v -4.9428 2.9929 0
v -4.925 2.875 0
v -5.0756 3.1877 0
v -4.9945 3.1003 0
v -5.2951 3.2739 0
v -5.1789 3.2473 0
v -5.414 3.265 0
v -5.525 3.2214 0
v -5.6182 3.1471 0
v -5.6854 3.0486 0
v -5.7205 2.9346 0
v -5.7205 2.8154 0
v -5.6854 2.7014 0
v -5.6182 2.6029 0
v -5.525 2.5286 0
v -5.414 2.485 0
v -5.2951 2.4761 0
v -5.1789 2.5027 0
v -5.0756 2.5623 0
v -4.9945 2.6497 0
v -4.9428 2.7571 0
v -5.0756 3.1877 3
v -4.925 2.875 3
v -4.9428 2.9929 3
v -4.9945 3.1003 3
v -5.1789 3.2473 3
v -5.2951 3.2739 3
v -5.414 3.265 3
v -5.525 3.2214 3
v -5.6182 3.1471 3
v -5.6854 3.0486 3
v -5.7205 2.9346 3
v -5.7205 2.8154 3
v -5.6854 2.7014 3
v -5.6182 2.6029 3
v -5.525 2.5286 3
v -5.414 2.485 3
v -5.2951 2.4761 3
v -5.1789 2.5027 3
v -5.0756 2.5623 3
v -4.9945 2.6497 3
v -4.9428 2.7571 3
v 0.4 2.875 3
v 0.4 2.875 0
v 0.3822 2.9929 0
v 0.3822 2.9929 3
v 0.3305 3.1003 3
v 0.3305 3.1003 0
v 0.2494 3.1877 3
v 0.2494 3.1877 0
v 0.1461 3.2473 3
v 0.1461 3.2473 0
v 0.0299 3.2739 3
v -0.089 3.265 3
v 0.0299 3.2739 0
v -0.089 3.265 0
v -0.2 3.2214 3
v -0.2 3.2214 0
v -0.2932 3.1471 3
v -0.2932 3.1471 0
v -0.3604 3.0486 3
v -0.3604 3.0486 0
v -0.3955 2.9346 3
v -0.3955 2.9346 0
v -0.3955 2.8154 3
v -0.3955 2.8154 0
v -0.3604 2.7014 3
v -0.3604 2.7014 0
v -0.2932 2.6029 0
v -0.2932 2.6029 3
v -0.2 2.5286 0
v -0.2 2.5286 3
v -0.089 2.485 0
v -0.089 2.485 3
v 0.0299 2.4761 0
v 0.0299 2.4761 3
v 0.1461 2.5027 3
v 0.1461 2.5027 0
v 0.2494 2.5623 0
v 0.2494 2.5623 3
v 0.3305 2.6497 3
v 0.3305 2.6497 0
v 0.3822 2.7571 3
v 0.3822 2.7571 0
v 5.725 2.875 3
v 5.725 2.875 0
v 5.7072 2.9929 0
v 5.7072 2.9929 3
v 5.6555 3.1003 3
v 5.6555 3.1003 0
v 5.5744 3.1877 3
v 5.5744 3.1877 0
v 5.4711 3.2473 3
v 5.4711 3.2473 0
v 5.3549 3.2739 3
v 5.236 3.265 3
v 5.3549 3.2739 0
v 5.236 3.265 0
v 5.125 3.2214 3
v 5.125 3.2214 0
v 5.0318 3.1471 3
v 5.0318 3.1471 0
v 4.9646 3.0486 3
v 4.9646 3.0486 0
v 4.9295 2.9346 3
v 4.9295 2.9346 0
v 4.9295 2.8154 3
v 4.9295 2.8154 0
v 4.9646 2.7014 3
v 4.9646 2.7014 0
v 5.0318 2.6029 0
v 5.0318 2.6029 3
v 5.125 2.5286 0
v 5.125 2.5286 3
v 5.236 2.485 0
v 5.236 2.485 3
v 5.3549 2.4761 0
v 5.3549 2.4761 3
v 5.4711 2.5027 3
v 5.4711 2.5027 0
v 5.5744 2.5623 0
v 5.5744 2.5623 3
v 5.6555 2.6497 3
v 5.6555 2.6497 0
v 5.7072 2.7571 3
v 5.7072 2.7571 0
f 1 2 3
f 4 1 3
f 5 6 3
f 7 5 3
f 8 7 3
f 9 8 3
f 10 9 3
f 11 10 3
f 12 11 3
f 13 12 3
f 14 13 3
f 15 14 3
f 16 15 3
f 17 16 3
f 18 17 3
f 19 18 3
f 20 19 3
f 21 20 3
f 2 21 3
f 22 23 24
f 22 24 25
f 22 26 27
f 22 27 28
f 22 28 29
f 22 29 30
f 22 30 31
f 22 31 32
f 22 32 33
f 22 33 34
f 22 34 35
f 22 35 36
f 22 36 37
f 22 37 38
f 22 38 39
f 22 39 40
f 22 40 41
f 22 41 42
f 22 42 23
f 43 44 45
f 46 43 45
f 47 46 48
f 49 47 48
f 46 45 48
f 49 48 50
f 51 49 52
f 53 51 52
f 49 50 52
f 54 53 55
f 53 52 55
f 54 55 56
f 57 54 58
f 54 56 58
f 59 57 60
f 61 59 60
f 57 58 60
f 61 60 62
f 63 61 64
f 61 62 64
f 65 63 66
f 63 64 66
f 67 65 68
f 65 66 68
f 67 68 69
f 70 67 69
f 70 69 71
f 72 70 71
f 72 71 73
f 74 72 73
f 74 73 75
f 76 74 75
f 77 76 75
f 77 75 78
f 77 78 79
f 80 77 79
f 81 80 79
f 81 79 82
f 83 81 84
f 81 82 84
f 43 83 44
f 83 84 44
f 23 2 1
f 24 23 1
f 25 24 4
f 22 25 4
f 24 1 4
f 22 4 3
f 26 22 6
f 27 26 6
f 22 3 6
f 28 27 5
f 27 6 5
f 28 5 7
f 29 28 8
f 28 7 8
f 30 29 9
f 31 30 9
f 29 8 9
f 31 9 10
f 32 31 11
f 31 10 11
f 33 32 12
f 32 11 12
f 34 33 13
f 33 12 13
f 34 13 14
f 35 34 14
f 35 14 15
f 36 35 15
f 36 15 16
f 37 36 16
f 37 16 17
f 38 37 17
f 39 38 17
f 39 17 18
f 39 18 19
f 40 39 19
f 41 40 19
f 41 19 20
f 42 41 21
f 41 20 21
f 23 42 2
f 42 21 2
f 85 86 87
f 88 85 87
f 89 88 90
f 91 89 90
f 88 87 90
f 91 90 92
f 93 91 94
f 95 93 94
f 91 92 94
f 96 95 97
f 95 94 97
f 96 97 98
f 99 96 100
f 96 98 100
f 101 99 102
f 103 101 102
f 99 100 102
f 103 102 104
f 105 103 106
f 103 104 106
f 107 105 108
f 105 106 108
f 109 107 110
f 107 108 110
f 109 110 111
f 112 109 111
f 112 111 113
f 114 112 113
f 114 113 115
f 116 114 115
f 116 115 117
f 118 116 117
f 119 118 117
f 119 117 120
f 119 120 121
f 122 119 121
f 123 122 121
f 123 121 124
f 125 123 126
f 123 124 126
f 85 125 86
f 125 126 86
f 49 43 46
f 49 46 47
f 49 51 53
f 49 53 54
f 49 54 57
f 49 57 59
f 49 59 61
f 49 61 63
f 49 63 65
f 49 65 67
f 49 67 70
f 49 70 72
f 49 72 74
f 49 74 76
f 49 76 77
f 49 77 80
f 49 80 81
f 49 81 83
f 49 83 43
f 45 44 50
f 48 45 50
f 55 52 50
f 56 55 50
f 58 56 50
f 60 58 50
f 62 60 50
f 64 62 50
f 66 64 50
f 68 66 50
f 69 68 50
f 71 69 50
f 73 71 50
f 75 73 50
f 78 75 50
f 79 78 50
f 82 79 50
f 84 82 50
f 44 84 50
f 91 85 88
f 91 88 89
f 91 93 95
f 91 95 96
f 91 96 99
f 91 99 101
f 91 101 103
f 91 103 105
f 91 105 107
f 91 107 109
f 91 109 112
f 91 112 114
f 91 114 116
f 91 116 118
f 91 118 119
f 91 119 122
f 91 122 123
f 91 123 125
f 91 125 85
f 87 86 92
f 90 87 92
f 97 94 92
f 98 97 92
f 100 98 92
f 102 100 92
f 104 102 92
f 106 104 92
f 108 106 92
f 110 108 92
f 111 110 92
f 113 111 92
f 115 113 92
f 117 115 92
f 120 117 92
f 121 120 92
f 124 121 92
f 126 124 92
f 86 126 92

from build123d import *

# Parameters (mm, degrees)
SKETCH1_R        = 0.4
EXTRUDE1_DEPTH   = 3
EXTRUDE1_2_DEPTH = 3
EXTRUDE1_3_DEPTH = 3


with BuildPart() as part:
    # Sketch1 → Extrude1 (new body)
    with BuildSketch(Plane.XY):
        with Locations((0, 2.875)):
            Circle(SKETCH1_R)
    extrude(amount=EXTRUDE1_DEPTH)


with BuildPart() as body_2:
    # Sketch1 → Extrude1 2 (new body)
    with BuildSketch(Plane.XY):
        with Locations((-5.325, 2.875)):
            Circle(SKETCH1_R)
    extrude(amount=EXTRUDE1_2_DEPTH)


with BuildPart() as body_3:
    # Sketch1 → Extrude1 3 (new body)
    with BuildSketch(Plane.XY):
        with Locations((5.325, 2.875)):
            Circle(SKETCH1_R)
    extrude(amount=EXTRUDE1_3_DEPTH)


solid = Compound([part.part, body_2.part, body_3.part])
